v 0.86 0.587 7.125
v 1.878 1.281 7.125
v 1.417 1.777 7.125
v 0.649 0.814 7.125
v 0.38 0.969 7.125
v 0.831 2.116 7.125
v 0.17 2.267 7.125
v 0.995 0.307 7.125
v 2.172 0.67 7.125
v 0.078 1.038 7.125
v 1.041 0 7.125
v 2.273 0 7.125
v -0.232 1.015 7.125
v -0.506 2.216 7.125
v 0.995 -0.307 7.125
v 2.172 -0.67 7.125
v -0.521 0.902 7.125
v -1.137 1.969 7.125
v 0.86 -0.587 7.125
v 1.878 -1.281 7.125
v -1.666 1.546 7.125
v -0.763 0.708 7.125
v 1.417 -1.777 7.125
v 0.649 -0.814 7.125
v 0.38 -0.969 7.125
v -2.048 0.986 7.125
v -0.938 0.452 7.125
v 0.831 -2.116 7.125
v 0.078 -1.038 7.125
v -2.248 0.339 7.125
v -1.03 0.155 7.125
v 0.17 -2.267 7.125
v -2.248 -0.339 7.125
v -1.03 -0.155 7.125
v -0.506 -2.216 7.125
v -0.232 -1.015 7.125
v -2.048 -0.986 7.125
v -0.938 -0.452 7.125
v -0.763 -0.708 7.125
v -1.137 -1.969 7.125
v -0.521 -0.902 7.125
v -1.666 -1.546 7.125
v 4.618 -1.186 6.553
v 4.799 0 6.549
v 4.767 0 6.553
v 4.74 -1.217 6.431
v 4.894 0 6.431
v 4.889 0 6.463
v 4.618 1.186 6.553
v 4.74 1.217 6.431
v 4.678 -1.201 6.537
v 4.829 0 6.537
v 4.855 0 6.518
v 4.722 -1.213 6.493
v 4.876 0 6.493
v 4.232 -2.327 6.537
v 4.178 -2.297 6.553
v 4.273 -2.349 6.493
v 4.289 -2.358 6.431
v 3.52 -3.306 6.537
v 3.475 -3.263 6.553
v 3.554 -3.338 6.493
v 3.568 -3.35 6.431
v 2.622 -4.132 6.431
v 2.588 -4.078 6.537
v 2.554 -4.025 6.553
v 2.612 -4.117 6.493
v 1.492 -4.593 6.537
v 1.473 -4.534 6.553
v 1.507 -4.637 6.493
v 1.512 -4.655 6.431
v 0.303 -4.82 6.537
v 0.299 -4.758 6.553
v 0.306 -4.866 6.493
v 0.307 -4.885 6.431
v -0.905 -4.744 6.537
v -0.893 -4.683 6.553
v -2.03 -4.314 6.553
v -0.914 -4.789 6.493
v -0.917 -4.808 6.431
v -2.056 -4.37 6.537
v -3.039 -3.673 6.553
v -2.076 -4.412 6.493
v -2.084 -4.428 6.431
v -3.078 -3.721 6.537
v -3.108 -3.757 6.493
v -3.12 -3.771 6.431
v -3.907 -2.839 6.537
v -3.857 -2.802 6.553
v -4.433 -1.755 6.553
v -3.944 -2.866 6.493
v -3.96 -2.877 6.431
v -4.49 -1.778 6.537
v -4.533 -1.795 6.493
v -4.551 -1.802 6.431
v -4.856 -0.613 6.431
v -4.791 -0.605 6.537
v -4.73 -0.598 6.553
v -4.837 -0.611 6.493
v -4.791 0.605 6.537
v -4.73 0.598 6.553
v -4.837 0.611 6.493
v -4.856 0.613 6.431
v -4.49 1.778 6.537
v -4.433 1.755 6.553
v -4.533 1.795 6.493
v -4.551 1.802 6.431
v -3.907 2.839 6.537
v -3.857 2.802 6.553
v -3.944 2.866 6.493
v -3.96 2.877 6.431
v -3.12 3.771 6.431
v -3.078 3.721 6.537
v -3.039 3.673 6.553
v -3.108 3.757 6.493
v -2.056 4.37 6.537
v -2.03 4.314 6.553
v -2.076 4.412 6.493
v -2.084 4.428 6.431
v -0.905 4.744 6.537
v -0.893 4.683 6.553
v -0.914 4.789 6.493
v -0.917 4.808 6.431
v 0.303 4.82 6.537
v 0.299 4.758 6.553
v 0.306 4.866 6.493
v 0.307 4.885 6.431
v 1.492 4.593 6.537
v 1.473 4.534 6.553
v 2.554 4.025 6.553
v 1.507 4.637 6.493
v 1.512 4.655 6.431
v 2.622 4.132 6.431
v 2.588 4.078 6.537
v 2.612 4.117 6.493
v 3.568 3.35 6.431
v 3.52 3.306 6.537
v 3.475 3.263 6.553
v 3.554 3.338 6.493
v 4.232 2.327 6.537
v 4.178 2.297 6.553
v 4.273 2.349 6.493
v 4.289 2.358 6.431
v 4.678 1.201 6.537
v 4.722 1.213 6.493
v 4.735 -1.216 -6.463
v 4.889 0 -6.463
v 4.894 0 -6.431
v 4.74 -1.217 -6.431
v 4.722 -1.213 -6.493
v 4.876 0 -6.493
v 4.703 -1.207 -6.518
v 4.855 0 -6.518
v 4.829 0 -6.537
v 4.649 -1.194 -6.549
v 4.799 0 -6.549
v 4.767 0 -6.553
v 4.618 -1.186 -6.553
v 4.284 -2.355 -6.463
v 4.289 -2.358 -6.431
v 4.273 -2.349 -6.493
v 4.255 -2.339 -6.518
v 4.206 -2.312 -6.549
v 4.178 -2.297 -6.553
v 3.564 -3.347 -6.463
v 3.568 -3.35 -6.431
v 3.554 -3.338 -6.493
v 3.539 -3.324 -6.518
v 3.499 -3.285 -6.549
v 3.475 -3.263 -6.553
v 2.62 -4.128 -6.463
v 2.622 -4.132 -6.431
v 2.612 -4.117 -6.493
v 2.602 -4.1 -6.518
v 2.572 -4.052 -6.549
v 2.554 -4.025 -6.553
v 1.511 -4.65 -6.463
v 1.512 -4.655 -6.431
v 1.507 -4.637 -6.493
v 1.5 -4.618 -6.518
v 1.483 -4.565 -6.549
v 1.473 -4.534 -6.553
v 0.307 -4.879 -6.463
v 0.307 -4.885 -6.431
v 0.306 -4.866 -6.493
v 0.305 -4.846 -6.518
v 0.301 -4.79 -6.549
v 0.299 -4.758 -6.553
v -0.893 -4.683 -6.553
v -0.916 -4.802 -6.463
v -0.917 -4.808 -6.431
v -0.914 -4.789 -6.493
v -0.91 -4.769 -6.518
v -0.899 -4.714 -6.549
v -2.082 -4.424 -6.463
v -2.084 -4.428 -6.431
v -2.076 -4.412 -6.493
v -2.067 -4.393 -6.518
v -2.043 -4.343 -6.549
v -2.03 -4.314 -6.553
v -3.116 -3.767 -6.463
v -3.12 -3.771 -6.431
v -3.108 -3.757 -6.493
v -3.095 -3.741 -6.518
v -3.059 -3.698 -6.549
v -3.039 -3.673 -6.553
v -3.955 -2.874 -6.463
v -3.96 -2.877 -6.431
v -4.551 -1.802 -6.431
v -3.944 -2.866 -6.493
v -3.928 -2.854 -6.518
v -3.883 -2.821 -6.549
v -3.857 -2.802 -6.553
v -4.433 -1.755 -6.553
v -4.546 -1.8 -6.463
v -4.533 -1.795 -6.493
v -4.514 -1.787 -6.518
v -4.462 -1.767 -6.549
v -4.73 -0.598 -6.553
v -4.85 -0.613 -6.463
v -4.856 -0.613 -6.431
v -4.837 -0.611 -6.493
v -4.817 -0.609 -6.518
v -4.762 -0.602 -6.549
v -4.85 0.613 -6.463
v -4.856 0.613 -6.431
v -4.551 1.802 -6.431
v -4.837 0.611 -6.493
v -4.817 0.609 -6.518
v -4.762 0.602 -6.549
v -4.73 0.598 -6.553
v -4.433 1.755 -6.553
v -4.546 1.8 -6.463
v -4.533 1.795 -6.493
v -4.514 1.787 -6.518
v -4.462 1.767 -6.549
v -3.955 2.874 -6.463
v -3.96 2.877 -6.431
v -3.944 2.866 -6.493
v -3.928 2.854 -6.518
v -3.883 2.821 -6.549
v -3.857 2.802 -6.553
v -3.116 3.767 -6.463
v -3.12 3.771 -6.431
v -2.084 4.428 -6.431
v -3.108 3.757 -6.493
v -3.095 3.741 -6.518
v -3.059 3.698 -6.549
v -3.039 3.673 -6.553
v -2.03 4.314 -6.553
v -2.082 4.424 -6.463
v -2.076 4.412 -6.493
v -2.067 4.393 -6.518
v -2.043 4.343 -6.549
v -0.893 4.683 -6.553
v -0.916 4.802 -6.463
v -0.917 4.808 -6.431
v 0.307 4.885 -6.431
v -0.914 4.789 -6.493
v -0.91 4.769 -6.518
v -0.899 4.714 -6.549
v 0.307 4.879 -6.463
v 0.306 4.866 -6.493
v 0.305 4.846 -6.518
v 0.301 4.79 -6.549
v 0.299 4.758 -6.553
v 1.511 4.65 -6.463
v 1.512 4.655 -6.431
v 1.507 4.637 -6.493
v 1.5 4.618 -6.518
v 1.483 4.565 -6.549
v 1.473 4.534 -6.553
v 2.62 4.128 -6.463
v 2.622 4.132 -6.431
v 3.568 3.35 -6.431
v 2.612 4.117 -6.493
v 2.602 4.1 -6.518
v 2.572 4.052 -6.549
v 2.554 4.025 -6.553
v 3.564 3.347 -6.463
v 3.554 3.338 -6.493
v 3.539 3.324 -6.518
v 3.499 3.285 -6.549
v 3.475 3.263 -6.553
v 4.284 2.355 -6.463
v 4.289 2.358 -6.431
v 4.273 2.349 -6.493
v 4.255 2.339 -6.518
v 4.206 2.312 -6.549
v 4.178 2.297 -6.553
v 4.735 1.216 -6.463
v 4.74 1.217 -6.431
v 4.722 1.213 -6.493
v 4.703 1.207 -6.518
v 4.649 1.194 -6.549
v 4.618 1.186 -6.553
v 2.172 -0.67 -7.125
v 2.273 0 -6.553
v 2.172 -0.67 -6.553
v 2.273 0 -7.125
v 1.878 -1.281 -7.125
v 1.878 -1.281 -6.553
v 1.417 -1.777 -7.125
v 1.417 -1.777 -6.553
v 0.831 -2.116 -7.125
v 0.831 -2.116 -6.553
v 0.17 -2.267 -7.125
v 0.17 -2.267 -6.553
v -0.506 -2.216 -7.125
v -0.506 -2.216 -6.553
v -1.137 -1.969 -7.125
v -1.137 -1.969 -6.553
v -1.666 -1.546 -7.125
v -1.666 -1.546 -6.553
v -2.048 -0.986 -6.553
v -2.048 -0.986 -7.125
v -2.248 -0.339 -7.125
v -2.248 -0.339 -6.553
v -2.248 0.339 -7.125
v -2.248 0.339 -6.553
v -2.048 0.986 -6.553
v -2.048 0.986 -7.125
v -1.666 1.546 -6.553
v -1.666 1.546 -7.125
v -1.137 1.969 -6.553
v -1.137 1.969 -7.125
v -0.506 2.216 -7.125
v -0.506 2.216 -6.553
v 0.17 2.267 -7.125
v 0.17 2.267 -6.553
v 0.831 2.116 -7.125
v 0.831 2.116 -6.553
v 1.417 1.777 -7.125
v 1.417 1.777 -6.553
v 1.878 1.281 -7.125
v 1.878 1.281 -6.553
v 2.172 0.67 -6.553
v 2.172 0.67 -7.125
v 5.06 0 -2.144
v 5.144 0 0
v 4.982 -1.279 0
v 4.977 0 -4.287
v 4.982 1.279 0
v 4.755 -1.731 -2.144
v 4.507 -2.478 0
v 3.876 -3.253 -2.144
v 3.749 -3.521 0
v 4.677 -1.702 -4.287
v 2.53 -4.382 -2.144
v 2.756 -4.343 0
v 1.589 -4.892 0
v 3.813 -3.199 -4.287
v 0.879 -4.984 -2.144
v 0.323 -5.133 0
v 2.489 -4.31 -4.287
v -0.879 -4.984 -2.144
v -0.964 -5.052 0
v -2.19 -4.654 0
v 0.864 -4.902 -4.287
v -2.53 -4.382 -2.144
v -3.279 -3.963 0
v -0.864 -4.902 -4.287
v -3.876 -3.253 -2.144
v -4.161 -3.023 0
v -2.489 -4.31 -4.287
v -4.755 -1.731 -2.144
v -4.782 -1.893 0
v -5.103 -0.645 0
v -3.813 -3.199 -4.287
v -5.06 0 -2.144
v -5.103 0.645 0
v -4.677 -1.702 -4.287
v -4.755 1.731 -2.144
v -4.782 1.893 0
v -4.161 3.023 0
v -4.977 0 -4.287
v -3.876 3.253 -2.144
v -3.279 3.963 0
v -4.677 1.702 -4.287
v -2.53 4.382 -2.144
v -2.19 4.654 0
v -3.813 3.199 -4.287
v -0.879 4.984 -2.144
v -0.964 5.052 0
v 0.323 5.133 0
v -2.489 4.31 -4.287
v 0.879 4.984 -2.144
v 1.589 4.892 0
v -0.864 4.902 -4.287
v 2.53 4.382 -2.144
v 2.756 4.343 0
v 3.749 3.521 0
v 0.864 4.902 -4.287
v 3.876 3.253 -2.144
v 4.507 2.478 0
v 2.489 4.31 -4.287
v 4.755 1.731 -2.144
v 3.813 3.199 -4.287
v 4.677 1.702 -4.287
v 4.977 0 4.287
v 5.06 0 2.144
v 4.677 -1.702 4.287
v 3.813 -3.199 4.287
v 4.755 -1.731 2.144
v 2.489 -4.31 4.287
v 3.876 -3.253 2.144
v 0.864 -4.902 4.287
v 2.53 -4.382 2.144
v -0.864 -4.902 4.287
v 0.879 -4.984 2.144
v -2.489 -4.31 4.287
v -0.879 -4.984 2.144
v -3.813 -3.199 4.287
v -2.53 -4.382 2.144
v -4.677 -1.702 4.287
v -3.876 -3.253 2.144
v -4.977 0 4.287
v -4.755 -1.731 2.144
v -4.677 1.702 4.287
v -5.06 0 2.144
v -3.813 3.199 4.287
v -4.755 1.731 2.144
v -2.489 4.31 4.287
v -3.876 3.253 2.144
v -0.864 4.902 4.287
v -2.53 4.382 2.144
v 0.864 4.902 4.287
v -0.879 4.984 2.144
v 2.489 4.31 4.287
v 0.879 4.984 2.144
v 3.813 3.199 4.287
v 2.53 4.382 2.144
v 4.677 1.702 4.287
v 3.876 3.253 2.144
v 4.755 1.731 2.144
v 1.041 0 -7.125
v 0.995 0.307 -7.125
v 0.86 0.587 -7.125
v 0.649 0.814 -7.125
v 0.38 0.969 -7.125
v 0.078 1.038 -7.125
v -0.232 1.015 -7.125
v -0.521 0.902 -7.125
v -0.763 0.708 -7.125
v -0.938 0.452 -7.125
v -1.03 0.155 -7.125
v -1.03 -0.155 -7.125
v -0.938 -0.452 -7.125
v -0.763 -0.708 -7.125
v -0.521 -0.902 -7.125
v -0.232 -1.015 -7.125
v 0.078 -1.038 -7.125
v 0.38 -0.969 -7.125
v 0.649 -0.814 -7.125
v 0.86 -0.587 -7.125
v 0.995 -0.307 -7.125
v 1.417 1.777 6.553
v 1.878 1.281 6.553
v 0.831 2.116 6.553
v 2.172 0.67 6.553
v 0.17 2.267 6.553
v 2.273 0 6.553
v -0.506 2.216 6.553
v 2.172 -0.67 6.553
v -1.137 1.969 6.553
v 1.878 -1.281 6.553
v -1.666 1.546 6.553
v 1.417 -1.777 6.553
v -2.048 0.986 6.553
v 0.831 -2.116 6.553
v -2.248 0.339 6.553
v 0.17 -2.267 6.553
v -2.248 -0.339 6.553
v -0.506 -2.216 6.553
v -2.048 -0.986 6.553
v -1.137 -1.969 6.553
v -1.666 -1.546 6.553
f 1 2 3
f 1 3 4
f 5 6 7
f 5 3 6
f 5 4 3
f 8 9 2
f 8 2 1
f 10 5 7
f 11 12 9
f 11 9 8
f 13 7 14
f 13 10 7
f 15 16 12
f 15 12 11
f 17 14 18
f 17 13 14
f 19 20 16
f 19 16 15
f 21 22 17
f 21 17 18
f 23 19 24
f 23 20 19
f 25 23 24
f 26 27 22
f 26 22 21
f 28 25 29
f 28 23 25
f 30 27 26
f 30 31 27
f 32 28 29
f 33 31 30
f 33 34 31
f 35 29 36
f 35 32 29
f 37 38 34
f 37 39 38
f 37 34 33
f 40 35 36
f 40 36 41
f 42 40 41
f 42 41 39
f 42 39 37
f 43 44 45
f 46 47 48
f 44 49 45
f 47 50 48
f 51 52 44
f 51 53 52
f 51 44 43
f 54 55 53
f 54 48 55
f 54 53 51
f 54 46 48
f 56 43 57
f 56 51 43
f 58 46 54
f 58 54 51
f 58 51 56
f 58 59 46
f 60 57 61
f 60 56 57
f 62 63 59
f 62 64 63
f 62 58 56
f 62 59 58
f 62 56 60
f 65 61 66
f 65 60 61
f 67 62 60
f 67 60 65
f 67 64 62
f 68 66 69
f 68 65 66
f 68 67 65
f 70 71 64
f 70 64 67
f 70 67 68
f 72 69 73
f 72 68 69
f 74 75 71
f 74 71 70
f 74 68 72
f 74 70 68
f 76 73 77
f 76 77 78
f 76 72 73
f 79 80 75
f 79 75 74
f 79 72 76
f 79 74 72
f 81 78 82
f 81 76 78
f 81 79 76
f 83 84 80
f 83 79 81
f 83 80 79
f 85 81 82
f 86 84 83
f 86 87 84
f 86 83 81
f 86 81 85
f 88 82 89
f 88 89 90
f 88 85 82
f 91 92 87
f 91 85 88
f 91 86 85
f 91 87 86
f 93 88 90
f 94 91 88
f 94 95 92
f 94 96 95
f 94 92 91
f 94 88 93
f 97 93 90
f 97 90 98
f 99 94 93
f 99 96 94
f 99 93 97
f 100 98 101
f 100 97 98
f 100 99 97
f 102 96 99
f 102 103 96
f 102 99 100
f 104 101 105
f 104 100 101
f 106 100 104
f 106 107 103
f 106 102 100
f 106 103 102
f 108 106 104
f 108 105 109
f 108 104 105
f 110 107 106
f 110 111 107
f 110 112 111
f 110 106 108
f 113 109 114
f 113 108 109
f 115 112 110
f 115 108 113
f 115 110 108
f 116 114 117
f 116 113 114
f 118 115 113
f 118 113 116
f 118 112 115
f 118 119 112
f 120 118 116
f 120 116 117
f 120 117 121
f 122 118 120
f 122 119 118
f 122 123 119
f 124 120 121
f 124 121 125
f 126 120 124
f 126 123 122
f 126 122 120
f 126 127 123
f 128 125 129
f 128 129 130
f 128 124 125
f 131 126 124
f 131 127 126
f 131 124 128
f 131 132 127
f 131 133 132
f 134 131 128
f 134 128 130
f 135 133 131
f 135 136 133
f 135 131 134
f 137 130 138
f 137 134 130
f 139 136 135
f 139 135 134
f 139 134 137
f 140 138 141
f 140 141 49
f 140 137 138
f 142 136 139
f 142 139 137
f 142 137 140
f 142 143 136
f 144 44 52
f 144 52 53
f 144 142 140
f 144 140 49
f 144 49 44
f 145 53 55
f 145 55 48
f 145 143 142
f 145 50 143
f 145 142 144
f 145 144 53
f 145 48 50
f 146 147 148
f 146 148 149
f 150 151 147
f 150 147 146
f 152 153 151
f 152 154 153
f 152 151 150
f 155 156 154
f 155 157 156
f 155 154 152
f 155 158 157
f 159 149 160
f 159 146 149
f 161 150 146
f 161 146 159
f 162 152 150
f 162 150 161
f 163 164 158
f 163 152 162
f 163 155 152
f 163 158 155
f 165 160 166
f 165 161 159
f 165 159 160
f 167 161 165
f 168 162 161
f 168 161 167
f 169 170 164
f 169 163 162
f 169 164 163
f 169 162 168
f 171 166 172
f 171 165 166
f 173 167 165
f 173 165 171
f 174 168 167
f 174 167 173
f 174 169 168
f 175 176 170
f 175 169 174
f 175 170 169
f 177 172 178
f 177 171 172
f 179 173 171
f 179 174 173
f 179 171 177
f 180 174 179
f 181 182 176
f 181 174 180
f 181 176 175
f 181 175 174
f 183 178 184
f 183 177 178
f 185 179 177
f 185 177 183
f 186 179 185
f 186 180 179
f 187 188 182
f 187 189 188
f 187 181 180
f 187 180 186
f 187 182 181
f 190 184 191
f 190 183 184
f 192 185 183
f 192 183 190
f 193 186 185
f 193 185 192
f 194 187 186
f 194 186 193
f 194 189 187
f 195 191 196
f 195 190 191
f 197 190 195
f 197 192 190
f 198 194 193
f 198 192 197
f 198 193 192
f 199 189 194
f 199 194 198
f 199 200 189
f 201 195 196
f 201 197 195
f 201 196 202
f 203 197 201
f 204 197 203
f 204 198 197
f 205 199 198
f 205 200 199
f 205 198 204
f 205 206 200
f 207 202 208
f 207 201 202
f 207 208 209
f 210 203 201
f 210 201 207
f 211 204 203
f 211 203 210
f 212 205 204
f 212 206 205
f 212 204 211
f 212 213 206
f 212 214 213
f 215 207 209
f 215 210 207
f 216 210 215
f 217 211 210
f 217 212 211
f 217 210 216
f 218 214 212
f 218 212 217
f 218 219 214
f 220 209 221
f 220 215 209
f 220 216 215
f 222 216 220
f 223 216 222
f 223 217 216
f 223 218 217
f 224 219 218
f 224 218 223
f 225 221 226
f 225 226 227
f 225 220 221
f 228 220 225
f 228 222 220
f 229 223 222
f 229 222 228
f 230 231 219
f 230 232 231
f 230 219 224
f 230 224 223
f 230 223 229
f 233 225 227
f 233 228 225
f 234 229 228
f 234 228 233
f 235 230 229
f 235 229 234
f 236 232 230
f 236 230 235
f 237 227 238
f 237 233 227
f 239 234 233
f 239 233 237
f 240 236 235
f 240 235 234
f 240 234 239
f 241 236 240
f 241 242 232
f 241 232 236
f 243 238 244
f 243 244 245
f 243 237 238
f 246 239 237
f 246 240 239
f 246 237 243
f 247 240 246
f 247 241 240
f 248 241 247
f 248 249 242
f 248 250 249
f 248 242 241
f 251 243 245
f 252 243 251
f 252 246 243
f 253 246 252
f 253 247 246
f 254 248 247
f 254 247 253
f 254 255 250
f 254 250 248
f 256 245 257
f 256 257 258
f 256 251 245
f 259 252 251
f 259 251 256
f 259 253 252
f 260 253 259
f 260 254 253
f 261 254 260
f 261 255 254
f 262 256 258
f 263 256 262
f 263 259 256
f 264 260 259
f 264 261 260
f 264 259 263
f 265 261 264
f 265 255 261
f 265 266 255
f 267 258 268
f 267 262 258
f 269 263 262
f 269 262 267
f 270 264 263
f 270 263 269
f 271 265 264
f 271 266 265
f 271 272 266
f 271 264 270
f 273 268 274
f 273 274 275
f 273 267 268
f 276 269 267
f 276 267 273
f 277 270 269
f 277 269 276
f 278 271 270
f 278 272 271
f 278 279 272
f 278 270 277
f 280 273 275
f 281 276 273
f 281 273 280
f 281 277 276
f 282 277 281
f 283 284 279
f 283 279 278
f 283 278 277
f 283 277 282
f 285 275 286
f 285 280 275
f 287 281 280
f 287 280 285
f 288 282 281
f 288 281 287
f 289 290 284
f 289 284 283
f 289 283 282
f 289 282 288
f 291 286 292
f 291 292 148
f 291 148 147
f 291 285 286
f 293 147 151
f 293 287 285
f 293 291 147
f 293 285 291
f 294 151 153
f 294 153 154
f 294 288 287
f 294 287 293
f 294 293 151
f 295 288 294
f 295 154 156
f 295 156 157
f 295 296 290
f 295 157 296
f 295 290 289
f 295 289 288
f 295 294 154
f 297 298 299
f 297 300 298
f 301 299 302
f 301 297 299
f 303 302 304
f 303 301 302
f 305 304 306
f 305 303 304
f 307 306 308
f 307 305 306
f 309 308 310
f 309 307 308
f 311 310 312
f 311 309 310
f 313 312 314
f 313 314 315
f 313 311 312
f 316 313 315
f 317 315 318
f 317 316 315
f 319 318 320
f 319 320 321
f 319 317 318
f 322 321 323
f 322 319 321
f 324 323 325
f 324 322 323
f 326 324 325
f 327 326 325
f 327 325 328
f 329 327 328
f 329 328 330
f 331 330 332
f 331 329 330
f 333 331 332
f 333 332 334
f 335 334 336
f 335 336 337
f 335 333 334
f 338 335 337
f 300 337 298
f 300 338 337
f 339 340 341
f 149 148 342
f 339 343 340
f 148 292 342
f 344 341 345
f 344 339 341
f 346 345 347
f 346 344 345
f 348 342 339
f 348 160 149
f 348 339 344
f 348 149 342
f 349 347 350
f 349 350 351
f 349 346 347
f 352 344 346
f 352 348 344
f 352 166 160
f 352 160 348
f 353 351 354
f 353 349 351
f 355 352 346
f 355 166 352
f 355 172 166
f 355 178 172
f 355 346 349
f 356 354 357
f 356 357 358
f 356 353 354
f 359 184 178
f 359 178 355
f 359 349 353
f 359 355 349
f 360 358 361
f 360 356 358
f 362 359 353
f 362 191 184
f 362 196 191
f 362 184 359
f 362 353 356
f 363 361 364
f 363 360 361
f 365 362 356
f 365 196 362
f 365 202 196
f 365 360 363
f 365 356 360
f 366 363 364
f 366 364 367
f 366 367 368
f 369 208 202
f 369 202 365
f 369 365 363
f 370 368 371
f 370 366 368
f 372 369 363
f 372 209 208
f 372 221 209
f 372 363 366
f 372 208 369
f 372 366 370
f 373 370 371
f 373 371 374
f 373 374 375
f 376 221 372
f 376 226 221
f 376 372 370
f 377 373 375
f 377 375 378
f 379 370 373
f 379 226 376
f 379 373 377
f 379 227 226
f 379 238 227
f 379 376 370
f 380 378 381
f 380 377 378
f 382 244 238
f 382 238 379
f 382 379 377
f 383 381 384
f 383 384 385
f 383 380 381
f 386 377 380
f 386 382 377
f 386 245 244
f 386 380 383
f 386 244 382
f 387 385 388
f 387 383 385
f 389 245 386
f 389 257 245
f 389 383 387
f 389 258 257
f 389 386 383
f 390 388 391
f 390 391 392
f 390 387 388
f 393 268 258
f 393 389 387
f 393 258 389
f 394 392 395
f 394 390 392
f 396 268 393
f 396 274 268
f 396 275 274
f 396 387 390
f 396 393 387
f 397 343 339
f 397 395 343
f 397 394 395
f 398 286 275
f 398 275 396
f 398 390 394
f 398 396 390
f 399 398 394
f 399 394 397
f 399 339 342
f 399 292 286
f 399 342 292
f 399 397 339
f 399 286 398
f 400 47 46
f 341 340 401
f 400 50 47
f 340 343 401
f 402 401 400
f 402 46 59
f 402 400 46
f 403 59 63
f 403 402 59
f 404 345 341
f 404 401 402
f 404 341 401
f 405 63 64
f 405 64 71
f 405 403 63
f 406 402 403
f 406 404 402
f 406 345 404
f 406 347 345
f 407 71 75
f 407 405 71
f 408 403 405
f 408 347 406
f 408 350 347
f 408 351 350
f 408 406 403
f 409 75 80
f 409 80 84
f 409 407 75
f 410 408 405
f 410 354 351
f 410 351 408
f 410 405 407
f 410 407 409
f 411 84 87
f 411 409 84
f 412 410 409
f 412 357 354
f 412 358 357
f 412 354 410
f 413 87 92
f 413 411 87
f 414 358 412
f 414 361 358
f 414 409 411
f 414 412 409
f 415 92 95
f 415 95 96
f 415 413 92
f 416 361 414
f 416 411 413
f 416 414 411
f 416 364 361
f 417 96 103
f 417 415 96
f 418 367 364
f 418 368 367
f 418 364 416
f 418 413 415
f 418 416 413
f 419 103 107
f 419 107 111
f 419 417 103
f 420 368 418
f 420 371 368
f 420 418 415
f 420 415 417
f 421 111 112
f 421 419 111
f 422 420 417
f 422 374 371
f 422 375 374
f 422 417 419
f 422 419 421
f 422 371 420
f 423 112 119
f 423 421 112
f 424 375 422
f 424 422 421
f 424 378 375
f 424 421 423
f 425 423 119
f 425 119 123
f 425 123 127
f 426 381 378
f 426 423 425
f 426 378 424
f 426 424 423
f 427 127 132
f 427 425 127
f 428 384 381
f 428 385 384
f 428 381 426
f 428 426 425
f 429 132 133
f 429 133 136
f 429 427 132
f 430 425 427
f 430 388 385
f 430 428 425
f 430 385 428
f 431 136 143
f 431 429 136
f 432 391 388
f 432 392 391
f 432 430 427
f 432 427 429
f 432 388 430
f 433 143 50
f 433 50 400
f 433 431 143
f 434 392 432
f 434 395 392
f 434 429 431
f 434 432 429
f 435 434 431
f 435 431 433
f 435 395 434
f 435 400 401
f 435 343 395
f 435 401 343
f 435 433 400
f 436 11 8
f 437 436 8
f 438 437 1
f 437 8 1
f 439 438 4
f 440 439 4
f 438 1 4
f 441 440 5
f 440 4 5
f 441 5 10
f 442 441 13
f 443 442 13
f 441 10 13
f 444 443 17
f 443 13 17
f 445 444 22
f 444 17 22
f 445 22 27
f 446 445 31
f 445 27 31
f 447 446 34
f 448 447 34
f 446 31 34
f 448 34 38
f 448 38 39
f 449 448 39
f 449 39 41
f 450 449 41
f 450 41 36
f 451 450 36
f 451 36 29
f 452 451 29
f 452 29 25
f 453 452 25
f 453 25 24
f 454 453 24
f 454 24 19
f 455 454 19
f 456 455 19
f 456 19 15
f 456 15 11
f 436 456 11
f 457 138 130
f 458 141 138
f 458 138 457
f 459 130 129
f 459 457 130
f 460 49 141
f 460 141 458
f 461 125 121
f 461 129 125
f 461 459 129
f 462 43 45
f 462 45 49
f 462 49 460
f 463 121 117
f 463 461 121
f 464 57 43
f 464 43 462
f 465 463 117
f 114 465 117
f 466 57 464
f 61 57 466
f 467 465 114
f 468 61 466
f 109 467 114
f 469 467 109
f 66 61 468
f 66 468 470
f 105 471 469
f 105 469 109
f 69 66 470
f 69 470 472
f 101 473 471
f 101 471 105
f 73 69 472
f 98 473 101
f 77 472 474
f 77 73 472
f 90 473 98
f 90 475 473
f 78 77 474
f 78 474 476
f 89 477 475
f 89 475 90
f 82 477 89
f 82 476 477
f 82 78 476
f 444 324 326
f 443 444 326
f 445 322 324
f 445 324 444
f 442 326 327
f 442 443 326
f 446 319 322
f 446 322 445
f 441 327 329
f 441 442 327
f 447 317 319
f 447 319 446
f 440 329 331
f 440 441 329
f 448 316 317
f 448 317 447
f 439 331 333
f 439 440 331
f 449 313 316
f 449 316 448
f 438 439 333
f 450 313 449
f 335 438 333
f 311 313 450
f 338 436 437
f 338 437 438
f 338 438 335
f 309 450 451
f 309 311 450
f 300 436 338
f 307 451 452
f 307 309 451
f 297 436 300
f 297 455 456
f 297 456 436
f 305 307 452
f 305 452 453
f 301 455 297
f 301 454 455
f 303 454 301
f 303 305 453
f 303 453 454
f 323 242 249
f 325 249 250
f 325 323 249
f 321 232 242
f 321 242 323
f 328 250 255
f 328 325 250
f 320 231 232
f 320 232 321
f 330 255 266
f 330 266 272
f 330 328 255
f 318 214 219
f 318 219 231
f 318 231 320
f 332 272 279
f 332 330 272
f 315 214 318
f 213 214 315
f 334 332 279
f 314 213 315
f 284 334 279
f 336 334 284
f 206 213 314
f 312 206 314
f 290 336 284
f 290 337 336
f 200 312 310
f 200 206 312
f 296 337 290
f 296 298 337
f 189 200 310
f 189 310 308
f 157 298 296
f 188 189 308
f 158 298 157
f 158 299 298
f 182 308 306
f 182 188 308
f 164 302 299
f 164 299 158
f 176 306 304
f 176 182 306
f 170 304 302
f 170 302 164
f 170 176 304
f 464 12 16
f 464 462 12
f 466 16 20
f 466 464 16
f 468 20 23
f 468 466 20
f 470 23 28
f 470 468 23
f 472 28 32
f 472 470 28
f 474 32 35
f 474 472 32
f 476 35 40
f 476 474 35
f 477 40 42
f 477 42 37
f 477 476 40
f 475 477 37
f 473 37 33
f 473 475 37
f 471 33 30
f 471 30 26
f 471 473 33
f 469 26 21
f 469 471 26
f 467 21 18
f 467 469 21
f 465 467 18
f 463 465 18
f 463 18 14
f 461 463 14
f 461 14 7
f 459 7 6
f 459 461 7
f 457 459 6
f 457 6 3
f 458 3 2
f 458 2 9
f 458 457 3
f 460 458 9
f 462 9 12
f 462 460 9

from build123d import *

# Parameters (mm, degrees)
SKETCH2_R          = 1.0414
CUT_EXTRUDE1_DEPTH = 16.998643219
FILLET1_R          = 0.127


with BuildPart() as part:
    # Sketch1 → Revolve1 (revolve)
    with BuildSketch(Plane(origin=(0, 0, 0), x_dir=(0, 0, -1), z_dir=(1, 0, 0)), mode=Mode.PRIVATE) as revolve1_sk:
        Polygon((-7.1247, 0), (-7.1247, 2.2733), (-6.5532, 2.2733), (-6.5532, 4.8895), (0, 5.1435), (6.5532, 4.8895), (6.5532, 2.2733), (7.1247, 2.2733), (7.1247, 0), align=None)
    revolve(revolve1_sk.sketch.rotate(Axis((0, 0, 7.1247), (0, 0, -1)), 90), axis=Axis((0, 0, 7.1247), (0, 0, -1)))

    # Sketch2 → Cut-Extrude1 (cut, through all)
    with BuildSketch(Plane.XY.offset(7.1247)):
        Circle(SKETCH2_R)
    extrude(amount=-CUT_EXTRUDE1_DEPTH, mode=Mode.SUBTRACT)

    # Fillet1
    fillet1_edges = [part.edges().sort_by_distance(p)[0] for p in [
        (-4.8895, 0, 6.5532),
        (-4.8895, 0, -6.5532),
    ]]
    fillet(fillet1_edges, radius=FILLET1_R)


solid = part.part
